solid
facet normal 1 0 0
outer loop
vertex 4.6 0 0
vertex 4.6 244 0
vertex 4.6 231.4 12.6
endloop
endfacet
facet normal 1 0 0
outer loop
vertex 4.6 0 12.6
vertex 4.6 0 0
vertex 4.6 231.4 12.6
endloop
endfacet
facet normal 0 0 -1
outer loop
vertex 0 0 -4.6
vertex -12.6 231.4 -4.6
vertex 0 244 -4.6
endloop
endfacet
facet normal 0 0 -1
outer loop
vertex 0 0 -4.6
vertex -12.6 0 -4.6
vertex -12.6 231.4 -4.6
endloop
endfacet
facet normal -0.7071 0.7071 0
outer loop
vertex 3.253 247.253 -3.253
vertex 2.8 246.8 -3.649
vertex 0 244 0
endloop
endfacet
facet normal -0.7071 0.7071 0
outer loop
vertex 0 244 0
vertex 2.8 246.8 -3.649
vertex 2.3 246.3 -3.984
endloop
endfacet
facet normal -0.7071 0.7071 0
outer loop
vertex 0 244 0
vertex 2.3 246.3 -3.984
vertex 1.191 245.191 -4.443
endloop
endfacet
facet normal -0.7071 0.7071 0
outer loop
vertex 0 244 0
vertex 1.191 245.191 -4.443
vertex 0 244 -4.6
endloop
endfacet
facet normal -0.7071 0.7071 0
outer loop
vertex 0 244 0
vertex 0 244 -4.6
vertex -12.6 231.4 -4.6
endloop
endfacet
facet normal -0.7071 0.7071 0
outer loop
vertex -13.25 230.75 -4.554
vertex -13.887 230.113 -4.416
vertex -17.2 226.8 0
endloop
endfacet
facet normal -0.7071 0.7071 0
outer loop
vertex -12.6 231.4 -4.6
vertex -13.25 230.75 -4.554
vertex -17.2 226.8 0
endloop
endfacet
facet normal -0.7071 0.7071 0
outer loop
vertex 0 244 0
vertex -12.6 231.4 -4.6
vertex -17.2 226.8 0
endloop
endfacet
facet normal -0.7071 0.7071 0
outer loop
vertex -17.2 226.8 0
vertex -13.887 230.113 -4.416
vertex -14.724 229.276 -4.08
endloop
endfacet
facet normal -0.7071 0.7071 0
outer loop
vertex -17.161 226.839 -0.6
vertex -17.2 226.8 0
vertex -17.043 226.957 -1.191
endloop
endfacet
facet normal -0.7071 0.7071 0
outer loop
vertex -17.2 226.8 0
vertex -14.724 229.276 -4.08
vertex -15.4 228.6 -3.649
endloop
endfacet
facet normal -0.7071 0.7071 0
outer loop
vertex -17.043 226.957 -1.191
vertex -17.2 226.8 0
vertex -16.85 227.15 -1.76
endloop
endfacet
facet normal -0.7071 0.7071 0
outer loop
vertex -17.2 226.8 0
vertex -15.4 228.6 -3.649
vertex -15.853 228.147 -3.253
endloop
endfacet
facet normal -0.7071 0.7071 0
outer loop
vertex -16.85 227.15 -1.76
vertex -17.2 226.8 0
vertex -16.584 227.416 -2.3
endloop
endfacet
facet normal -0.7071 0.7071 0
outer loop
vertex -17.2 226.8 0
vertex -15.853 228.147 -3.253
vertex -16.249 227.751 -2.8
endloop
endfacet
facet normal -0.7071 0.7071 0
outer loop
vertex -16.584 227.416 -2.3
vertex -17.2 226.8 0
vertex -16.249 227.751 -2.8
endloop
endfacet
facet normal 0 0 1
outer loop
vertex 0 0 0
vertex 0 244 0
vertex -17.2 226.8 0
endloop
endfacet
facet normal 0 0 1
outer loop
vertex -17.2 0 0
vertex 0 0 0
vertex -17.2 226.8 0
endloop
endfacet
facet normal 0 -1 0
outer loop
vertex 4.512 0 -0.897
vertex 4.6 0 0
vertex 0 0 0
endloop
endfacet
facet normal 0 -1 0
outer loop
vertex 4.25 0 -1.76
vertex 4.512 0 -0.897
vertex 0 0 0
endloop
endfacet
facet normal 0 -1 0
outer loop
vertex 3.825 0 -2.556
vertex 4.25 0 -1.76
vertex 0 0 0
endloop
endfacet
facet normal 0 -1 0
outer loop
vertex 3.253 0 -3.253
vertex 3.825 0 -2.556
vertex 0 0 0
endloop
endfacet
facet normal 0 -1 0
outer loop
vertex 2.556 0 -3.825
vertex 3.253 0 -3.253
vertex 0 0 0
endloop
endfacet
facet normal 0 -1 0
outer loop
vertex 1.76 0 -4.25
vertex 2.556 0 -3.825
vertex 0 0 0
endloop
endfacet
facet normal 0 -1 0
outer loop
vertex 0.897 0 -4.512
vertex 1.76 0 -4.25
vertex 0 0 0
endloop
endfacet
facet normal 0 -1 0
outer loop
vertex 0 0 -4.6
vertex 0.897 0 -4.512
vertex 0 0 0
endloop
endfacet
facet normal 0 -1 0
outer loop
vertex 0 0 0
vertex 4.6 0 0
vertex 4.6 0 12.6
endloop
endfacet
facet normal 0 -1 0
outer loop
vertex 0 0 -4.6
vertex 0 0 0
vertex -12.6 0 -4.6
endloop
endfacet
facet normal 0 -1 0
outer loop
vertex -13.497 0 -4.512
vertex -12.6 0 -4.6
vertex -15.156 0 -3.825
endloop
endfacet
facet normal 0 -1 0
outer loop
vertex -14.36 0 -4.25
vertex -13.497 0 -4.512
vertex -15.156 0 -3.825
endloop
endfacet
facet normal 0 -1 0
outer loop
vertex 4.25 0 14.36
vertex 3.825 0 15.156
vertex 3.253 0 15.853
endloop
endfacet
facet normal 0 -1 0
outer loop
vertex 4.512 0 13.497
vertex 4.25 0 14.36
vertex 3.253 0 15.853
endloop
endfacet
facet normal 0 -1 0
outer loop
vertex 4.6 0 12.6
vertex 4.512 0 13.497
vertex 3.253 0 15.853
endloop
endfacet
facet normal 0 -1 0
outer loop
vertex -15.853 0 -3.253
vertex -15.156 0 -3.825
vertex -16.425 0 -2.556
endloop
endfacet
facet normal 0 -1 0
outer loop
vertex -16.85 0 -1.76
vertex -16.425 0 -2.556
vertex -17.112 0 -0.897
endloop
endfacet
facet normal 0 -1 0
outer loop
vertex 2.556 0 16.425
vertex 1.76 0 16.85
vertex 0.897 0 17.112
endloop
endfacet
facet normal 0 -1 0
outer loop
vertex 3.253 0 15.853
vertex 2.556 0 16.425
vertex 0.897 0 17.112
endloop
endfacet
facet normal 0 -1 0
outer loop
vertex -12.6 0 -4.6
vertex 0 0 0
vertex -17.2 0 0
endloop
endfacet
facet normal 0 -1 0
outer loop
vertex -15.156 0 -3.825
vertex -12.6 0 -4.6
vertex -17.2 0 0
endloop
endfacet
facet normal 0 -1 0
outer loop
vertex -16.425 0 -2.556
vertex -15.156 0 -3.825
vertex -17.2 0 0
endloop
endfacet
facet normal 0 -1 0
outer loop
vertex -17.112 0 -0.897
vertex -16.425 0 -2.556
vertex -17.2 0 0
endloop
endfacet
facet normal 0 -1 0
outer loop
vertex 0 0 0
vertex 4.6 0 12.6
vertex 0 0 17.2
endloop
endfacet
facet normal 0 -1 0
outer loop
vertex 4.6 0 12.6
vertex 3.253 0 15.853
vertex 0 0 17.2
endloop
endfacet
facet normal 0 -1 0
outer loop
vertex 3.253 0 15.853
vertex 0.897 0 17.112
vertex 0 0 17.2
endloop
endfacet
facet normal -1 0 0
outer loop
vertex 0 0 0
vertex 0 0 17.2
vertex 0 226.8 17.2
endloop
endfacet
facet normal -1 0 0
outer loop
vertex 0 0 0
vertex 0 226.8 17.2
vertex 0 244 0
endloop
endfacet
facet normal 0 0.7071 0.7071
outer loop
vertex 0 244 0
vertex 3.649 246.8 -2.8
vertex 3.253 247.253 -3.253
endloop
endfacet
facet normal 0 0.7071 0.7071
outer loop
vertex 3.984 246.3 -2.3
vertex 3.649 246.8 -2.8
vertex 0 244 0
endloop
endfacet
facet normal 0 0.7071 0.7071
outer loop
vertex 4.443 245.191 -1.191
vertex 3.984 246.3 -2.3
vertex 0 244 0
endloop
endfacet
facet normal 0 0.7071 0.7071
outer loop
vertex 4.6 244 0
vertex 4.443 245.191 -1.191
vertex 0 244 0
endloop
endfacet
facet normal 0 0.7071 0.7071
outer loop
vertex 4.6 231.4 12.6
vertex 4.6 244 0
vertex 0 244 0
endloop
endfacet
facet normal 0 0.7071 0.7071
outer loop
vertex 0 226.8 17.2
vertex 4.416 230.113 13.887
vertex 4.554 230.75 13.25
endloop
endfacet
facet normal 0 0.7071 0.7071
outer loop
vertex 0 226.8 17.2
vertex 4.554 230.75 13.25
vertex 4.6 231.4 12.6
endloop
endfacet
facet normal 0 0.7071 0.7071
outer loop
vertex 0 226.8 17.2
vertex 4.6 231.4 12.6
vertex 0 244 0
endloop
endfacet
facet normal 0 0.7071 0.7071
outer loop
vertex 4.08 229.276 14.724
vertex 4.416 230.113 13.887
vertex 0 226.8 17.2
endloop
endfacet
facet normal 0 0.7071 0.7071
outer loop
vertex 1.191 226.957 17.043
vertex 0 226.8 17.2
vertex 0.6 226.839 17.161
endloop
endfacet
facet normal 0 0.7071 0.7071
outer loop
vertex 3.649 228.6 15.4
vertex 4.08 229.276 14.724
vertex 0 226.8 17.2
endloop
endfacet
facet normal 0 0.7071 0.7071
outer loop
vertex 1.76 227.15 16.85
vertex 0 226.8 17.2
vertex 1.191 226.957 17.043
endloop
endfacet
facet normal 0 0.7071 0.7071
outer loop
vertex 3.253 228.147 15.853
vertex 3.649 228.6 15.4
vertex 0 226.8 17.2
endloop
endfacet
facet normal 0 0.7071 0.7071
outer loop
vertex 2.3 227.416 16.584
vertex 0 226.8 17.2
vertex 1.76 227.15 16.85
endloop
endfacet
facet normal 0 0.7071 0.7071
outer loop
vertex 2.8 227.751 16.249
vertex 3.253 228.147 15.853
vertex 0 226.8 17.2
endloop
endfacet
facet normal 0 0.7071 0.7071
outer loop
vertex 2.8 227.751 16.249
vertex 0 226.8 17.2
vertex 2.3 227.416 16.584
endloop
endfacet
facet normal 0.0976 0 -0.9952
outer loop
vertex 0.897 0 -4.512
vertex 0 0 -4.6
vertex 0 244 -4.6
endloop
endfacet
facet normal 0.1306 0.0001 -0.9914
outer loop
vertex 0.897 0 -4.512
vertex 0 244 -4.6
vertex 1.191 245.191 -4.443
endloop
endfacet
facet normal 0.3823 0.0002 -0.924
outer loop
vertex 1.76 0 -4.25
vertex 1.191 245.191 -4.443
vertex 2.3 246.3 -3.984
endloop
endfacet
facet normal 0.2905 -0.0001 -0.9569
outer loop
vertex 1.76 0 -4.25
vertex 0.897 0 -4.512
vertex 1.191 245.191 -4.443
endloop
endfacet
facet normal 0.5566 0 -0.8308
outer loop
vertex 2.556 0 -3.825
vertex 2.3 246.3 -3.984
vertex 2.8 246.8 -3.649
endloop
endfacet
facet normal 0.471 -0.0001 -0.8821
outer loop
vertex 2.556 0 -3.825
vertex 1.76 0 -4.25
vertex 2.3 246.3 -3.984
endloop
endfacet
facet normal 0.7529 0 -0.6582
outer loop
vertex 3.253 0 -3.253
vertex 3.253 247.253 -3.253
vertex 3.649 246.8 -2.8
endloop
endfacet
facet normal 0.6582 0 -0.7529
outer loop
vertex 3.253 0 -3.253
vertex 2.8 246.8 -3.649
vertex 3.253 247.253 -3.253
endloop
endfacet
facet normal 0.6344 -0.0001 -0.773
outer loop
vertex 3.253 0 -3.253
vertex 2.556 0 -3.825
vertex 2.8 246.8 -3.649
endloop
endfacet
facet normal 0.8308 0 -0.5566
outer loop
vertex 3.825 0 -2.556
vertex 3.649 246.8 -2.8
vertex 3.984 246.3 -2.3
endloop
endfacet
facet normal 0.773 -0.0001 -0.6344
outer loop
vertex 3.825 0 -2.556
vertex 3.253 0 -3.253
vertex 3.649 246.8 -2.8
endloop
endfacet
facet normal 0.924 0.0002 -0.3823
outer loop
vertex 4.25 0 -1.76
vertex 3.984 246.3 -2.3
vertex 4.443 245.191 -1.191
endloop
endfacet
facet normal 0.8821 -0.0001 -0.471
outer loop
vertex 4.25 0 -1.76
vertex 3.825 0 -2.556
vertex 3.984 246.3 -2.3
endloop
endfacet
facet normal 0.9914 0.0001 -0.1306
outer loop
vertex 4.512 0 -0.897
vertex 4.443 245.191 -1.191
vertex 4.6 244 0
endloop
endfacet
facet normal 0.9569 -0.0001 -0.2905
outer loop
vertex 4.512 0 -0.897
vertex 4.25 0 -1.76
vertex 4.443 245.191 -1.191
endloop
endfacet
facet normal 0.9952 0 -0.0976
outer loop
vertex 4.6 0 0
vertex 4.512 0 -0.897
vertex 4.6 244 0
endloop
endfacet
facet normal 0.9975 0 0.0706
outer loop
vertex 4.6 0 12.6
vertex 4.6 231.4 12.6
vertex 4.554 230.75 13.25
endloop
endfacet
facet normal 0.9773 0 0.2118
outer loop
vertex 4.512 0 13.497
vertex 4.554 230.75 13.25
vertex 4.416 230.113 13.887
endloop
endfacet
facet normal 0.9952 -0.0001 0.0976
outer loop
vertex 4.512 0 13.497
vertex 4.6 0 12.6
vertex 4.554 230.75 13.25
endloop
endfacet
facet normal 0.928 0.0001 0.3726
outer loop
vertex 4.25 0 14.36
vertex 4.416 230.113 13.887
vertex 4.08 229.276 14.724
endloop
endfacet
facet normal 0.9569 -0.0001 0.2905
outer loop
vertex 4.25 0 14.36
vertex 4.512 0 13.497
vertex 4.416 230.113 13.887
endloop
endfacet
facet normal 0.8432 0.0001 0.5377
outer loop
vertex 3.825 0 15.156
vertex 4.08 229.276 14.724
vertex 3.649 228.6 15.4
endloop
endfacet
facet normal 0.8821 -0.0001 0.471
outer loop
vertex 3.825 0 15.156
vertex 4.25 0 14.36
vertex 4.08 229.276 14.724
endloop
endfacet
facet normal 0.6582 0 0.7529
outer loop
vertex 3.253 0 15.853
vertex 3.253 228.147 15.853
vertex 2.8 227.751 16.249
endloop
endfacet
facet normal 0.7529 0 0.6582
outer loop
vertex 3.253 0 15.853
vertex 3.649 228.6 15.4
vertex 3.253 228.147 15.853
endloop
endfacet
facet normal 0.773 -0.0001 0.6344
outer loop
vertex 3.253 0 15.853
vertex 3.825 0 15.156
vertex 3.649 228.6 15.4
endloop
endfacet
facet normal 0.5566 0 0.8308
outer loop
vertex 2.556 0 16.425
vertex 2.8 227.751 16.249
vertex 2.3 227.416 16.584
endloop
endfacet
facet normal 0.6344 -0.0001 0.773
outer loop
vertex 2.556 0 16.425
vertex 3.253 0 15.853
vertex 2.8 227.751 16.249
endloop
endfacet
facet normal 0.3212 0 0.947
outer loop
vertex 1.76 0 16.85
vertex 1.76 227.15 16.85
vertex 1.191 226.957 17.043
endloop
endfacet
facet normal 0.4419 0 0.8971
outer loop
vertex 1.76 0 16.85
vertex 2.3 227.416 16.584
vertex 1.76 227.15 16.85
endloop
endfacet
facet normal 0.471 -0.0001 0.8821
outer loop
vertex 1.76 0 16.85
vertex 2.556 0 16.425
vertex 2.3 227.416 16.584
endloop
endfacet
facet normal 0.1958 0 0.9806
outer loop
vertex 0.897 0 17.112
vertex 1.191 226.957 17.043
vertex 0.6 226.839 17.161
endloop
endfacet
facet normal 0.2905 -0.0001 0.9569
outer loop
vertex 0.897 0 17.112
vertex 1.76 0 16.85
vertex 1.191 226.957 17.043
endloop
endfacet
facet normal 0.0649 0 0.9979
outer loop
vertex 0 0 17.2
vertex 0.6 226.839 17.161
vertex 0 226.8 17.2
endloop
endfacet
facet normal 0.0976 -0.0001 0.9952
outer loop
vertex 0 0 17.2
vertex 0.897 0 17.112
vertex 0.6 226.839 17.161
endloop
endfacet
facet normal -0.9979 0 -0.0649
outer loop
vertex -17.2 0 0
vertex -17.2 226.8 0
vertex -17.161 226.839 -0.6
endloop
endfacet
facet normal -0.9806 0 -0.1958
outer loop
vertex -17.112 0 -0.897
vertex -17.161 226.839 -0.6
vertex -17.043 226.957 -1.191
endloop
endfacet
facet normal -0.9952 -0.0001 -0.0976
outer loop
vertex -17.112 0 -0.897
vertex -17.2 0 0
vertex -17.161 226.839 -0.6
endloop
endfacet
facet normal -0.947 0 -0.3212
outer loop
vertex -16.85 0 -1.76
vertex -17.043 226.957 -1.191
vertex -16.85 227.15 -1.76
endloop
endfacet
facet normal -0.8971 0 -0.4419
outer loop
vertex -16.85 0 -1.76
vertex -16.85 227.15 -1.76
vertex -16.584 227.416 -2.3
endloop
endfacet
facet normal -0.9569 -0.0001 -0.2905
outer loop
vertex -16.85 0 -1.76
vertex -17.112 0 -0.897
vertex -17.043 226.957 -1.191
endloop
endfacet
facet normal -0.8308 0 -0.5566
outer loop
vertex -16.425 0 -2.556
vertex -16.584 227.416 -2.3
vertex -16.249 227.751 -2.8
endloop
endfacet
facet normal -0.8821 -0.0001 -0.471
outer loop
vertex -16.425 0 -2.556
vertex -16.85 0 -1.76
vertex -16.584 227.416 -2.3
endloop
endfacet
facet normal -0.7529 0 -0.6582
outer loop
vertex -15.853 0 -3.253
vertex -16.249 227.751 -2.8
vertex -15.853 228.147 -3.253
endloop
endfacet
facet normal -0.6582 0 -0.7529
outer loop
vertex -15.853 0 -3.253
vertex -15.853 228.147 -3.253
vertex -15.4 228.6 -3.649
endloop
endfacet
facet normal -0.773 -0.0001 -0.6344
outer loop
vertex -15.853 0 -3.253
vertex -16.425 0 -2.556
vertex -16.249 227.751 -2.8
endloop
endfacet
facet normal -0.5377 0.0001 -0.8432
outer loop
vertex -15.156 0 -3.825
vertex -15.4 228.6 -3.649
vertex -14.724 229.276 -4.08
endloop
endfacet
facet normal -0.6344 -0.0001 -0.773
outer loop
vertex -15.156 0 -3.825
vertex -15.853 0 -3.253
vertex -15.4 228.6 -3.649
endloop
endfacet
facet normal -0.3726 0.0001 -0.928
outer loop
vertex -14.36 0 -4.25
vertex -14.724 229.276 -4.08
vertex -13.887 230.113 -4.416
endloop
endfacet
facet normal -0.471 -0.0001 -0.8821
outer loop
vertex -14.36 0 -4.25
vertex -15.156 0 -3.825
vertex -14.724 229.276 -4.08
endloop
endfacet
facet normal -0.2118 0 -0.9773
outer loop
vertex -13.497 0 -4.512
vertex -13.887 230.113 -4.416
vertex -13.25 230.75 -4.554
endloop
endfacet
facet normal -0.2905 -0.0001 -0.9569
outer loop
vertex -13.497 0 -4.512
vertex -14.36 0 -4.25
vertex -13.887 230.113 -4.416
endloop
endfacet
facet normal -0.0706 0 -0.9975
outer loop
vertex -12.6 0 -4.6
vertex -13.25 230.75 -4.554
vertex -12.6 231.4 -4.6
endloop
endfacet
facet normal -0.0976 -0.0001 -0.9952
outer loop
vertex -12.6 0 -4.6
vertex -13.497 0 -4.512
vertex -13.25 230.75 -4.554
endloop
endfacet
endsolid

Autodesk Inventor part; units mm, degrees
ref_plane "YZ Plane" through (0, 0, 0) normal (1, 0, 0) x (0, 1, 0)
ref_plane "XZ Plane" through (0, 0, 0) normal (0, 1, 0) x (-1, 0, 0)
ref_plane "XY Plane" through (0, 0, 0) normal (0, 0, 1) x (1, 0, 0)
sketch "Skizze1" plane through (0, 0, 0) normal (0, 1, 0) x (-1, 0, 0)
  arc A0 (-4.6, 0) -> (0, -4.6) centre (0, 0) ccw
  line L0 (-4.6, 0) -> (-4.6, 12.6)
  arc A1 (0, 17.2) -> (-4.6, 12.6) centre (0, 12.6) ccw
  line L1 (0, 17.2) -> (0, 0)
  line L2 (0, 0) -> (17.2, 0)
  arc A2 (12.6, -4.6) -> (17.2, 0) centre (12.6, 0) ccw
  line L3 (12.6, -4.6) -> (0, -4.6)
  dimension "d0" = 4.6
  dimension "d1" = 21.8
extrude "Extrusion1" add sketch "Skizze1" along normal blind 248.6
sketch "Skizze2" plane through (4.6, 0, 12.6) normal (1, 0, 0) x (0, 0, -1)
  line L0 (17.2, 0) -> (17.2, 248.6) projected
  line L1 (17.2, 248.6) -> (-4.6, 226.8)
  line L2 (-4.6, 0) -> (-4.6, 248.6) projected
  line L3 (-4.6, 226.8) -> (-4.6, 248.6)
  line L4 (17.2, 248.6) -> (12.6, 248.6) projected
  line L5 (-4.6, 248.6) -> (17.2, 248.6)
  point P0 (12.6, 0)
  dimension "d4" = 45
extrude "Extrusion2" cut sketch "Skizze2" against normal through all
sketch "Skizze3" plane through (0, 0, -4.6) normal (0, 0, -1) x (-1, 0, 0)
  line L0 (-4.6, 0) -> (-4.6, 244) projected
  line L1 (17.2, 248.6) -> (-4.6, 248.6)
  line L2 (-4.6, 248.6) -> (17.2, 226.8)
  line L3 (17.2, 0) -> (17.2, 244) projected
  line L4 (17.2, 248.6) -> (17.2, 226.8)
  point P0 (0, 0)
  point P1 (0, 248.6)
  dimension "d9" = 45
extrude "Extrusion3" cut sketch "Skizze3" against normal through all
properties part number "eckeHochkant" material "Kiefer"
